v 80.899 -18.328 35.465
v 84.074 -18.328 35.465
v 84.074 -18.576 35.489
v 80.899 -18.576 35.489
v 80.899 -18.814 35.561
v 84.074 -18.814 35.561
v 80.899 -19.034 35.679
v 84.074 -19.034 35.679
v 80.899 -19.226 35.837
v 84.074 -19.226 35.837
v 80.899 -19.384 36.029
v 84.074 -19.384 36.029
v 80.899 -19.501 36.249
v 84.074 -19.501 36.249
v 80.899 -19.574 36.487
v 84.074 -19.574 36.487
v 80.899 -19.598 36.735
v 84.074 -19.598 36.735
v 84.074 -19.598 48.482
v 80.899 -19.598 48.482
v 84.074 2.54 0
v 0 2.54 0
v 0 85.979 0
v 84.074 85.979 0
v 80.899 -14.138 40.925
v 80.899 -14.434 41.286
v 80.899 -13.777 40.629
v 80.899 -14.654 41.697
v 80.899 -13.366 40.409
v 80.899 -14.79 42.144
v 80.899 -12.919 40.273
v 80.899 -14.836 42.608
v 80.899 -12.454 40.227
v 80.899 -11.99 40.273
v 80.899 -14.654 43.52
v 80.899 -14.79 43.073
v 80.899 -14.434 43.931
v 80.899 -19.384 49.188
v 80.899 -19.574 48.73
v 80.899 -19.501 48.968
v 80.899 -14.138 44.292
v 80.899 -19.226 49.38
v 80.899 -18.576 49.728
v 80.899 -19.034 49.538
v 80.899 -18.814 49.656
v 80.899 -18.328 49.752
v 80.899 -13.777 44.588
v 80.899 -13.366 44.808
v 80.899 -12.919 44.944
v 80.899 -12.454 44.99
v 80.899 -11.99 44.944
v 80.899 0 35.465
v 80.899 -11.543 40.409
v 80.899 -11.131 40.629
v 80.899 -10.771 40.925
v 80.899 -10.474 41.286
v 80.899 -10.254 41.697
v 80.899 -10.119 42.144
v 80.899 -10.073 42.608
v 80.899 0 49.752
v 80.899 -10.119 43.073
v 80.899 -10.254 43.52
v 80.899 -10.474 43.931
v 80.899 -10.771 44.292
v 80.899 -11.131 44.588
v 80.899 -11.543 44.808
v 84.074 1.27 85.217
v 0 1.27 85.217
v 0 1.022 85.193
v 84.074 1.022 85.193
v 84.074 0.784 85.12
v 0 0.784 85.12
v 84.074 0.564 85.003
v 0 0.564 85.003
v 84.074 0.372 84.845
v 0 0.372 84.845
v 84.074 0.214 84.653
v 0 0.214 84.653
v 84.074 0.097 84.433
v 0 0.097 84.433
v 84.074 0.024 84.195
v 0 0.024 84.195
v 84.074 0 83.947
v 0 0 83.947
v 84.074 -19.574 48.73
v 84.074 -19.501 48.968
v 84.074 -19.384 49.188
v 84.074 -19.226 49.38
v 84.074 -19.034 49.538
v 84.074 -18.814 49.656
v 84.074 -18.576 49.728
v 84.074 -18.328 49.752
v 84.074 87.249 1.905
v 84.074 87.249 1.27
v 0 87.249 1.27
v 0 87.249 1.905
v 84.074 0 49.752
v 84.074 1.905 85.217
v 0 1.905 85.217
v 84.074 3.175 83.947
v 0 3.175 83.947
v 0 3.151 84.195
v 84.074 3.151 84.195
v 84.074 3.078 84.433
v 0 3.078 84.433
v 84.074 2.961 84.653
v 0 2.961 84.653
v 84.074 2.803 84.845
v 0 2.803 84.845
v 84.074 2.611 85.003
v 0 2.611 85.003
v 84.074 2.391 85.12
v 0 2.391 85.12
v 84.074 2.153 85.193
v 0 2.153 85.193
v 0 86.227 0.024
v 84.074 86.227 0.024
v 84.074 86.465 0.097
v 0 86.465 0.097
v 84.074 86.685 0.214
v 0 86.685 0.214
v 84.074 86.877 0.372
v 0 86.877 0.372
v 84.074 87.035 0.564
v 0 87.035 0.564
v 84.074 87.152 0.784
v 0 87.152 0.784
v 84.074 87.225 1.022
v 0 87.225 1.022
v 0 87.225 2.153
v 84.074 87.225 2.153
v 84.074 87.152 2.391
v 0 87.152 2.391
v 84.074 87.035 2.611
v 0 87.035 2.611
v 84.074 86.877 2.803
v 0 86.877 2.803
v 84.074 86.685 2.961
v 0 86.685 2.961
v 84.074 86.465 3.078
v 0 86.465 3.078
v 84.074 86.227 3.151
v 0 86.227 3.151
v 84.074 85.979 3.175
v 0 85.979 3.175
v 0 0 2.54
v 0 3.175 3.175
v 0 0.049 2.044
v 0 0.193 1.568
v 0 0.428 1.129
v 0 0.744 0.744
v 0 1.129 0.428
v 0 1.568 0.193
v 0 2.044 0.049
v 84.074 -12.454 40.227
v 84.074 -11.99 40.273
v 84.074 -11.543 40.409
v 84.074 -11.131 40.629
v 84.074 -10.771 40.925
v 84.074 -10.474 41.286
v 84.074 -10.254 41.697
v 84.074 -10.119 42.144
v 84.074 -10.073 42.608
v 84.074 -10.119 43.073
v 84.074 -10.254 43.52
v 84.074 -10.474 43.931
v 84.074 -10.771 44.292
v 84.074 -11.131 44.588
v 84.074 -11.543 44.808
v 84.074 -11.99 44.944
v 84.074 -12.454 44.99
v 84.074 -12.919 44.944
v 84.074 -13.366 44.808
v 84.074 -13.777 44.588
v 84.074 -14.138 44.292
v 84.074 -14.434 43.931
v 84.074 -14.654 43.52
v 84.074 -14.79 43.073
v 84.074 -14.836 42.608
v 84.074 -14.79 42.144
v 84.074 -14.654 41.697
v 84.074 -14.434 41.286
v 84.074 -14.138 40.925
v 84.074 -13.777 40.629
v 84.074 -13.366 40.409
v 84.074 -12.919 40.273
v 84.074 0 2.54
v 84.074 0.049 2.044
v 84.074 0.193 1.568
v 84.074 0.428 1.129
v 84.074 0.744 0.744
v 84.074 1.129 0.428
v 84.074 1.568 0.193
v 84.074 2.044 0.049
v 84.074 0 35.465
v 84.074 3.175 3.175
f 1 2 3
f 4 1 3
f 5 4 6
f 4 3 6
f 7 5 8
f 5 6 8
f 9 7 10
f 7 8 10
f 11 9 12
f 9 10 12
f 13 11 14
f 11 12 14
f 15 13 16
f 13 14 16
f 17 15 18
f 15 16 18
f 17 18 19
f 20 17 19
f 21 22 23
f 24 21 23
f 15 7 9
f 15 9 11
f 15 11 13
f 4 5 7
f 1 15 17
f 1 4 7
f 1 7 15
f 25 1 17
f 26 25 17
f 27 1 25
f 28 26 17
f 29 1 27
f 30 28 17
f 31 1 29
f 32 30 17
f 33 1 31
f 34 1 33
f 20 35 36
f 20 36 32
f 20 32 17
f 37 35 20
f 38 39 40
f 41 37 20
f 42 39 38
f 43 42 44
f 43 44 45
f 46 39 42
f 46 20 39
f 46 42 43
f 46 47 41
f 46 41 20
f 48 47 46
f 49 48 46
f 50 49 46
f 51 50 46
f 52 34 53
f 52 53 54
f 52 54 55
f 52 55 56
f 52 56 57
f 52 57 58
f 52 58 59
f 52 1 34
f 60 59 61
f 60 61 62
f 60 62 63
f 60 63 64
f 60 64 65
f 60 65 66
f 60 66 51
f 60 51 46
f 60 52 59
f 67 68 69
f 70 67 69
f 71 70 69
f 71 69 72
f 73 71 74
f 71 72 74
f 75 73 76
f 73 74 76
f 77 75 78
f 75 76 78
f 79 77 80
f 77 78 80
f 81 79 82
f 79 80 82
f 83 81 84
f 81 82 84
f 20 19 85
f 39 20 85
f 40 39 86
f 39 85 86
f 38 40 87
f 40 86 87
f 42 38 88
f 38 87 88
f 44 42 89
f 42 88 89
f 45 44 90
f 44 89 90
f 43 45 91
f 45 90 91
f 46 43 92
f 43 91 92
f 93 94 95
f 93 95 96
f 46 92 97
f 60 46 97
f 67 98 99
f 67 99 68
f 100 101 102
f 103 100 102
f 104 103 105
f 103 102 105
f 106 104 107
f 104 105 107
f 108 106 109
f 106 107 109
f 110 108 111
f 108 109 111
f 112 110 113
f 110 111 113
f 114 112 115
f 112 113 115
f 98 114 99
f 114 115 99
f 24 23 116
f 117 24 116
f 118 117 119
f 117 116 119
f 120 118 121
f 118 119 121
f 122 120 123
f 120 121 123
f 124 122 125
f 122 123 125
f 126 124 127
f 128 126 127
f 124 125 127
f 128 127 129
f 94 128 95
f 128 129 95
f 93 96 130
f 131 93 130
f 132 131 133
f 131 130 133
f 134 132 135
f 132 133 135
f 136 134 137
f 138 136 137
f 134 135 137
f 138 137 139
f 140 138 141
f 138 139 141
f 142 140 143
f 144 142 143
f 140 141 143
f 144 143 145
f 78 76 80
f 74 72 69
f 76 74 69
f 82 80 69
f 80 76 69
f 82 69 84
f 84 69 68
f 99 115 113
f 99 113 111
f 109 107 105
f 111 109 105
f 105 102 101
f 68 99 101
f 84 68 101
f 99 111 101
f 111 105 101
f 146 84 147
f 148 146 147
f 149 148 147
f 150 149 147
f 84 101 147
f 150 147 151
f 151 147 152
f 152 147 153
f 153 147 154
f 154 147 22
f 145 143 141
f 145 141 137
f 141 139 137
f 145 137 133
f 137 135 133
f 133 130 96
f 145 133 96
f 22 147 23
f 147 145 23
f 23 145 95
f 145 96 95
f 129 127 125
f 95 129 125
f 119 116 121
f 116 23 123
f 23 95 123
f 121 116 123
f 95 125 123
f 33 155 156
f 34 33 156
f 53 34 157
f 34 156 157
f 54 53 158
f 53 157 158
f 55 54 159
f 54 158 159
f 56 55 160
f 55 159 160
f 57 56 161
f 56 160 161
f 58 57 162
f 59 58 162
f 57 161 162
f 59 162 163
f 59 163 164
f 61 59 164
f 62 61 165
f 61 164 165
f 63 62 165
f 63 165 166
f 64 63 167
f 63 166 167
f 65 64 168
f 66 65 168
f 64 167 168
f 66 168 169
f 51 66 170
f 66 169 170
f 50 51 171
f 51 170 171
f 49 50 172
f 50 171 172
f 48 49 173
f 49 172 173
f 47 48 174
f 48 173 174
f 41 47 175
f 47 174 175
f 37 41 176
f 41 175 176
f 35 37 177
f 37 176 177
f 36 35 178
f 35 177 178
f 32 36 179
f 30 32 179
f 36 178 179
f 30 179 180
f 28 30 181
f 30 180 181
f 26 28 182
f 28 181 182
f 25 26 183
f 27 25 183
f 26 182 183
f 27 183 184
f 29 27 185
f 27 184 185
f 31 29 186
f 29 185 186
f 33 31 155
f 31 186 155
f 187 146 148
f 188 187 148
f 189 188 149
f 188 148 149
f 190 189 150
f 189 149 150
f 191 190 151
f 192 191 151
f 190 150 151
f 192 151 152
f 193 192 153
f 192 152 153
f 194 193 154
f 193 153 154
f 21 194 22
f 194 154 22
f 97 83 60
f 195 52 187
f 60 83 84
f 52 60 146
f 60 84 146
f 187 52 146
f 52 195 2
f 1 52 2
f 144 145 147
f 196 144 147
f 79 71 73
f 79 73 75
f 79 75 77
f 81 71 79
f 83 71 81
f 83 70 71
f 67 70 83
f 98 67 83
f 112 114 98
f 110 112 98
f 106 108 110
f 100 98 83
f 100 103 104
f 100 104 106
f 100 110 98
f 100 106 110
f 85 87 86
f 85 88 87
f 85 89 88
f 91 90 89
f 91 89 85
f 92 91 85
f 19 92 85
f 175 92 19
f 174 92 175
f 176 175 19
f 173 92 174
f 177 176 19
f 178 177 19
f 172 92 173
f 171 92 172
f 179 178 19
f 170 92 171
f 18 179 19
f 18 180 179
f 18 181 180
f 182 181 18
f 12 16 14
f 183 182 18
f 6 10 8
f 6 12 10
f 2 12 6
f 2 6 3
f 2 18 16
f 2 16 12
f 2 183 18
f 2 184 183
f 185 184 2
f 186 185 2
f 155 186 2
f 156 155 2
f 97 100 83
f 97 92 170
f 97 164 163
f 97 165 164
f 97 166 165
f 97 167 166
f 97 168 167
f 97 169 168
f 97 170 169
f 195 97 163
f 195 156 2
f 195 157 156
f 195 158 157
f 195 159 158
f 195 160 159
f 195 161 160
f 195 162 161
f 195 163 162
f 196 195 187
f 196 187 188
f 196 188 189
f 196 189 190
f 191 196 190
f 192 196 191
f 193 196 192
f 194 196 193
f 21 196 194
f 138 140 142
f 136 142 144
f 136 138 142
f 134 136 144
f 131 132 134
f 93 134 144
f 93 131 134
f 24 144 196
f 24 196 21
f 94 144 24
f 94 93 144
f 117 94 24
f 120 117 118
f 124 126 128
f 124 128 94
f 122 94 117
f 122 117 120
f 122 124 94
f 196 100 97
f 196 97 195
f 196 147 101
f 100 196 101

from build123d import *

# Parameters (mm, degrees)
BOSS_EXTRUDE5_DEPTH = 84.074
SKETCH12_R          = 2.38125
BOSS_EXTRUDE6_DEPTH = 3.175


with BuildPart() as part:
    # Sketch11 → Boss-Extrude5 (new body)
    with BuildSketch(Plane(origin=(0, 0, 0), x_dir=(0, 0, -1), z_dir=(1, 0, 0))):
        with BuildLine():
            Line((0, 2.54), (0, 85.979))
            ThreePointArc((0, 85.979), (-0.371974388, 86.877025612), (-1.27, 87.249))
            Line((-1.27, 87.249), (-1.905, 87.249))
            ThreePointArc((-1.905, 87.249), (-2.803025612, 86.877025612), (-3.175, 85.979))
            Line((-3.175, 85.979), (-3.175, 3.175))
            Line((-3.175, 3.175), (-83.947, 3.175))
            ThreePointArc((-83.947, 3.175), (-84.845025612, 2.803025612), (-85.217, 1.905))
            Line((-85.217, 1.905), (-85.217, 1.27))
            ThreePointArc((-85.217, 1.27), (-84.845025612, 0.371974388), (-83.947, 0))
            Line((-83.947, 0), (-2.54, 0))
            ThreePointArc((-2.54, 0), (-0.743948776, 0.743948776), (0, 2.54))
        make_face()
    extrude(amount=BOSS_EXTRUDE5_DEPTH)

    # Sketch12 → Boss-Extrude6 (add)
    with BuildSketch(Plane(origin=(84.074, 0, 0), x_dir=(0, 0, -1), z_dir=(1, 0, 0))):
        with BuildLine():
            Line((-49.75225, -18.328132), (-49.75225, 0))
            Line((-49.75225, 0), (-35.46475, 0))
            Line((-35.46475, 0), (-35.46475, -18.328132))
            ThreePointArc((-35.46475, -18.328132), (-35.836724388, -19.226157612), (-36.73475, -19.598132))
            Line((-36.73475, -19.598132), (-48.48225, -19.598132))
            ThreePointArc((-48.48225, -19.598132), (-49.380275612, -19.226157612), (-49.75225, -18.328132))
        make_face()
        with Locations((-42.6085, -12.454382)):
            Circle(SKETCH12_R, mode=Mode.SUBTRACT)
    extrude(amount=-BOSS_EXTRUDE6_DEPTH)


solid = part.part
